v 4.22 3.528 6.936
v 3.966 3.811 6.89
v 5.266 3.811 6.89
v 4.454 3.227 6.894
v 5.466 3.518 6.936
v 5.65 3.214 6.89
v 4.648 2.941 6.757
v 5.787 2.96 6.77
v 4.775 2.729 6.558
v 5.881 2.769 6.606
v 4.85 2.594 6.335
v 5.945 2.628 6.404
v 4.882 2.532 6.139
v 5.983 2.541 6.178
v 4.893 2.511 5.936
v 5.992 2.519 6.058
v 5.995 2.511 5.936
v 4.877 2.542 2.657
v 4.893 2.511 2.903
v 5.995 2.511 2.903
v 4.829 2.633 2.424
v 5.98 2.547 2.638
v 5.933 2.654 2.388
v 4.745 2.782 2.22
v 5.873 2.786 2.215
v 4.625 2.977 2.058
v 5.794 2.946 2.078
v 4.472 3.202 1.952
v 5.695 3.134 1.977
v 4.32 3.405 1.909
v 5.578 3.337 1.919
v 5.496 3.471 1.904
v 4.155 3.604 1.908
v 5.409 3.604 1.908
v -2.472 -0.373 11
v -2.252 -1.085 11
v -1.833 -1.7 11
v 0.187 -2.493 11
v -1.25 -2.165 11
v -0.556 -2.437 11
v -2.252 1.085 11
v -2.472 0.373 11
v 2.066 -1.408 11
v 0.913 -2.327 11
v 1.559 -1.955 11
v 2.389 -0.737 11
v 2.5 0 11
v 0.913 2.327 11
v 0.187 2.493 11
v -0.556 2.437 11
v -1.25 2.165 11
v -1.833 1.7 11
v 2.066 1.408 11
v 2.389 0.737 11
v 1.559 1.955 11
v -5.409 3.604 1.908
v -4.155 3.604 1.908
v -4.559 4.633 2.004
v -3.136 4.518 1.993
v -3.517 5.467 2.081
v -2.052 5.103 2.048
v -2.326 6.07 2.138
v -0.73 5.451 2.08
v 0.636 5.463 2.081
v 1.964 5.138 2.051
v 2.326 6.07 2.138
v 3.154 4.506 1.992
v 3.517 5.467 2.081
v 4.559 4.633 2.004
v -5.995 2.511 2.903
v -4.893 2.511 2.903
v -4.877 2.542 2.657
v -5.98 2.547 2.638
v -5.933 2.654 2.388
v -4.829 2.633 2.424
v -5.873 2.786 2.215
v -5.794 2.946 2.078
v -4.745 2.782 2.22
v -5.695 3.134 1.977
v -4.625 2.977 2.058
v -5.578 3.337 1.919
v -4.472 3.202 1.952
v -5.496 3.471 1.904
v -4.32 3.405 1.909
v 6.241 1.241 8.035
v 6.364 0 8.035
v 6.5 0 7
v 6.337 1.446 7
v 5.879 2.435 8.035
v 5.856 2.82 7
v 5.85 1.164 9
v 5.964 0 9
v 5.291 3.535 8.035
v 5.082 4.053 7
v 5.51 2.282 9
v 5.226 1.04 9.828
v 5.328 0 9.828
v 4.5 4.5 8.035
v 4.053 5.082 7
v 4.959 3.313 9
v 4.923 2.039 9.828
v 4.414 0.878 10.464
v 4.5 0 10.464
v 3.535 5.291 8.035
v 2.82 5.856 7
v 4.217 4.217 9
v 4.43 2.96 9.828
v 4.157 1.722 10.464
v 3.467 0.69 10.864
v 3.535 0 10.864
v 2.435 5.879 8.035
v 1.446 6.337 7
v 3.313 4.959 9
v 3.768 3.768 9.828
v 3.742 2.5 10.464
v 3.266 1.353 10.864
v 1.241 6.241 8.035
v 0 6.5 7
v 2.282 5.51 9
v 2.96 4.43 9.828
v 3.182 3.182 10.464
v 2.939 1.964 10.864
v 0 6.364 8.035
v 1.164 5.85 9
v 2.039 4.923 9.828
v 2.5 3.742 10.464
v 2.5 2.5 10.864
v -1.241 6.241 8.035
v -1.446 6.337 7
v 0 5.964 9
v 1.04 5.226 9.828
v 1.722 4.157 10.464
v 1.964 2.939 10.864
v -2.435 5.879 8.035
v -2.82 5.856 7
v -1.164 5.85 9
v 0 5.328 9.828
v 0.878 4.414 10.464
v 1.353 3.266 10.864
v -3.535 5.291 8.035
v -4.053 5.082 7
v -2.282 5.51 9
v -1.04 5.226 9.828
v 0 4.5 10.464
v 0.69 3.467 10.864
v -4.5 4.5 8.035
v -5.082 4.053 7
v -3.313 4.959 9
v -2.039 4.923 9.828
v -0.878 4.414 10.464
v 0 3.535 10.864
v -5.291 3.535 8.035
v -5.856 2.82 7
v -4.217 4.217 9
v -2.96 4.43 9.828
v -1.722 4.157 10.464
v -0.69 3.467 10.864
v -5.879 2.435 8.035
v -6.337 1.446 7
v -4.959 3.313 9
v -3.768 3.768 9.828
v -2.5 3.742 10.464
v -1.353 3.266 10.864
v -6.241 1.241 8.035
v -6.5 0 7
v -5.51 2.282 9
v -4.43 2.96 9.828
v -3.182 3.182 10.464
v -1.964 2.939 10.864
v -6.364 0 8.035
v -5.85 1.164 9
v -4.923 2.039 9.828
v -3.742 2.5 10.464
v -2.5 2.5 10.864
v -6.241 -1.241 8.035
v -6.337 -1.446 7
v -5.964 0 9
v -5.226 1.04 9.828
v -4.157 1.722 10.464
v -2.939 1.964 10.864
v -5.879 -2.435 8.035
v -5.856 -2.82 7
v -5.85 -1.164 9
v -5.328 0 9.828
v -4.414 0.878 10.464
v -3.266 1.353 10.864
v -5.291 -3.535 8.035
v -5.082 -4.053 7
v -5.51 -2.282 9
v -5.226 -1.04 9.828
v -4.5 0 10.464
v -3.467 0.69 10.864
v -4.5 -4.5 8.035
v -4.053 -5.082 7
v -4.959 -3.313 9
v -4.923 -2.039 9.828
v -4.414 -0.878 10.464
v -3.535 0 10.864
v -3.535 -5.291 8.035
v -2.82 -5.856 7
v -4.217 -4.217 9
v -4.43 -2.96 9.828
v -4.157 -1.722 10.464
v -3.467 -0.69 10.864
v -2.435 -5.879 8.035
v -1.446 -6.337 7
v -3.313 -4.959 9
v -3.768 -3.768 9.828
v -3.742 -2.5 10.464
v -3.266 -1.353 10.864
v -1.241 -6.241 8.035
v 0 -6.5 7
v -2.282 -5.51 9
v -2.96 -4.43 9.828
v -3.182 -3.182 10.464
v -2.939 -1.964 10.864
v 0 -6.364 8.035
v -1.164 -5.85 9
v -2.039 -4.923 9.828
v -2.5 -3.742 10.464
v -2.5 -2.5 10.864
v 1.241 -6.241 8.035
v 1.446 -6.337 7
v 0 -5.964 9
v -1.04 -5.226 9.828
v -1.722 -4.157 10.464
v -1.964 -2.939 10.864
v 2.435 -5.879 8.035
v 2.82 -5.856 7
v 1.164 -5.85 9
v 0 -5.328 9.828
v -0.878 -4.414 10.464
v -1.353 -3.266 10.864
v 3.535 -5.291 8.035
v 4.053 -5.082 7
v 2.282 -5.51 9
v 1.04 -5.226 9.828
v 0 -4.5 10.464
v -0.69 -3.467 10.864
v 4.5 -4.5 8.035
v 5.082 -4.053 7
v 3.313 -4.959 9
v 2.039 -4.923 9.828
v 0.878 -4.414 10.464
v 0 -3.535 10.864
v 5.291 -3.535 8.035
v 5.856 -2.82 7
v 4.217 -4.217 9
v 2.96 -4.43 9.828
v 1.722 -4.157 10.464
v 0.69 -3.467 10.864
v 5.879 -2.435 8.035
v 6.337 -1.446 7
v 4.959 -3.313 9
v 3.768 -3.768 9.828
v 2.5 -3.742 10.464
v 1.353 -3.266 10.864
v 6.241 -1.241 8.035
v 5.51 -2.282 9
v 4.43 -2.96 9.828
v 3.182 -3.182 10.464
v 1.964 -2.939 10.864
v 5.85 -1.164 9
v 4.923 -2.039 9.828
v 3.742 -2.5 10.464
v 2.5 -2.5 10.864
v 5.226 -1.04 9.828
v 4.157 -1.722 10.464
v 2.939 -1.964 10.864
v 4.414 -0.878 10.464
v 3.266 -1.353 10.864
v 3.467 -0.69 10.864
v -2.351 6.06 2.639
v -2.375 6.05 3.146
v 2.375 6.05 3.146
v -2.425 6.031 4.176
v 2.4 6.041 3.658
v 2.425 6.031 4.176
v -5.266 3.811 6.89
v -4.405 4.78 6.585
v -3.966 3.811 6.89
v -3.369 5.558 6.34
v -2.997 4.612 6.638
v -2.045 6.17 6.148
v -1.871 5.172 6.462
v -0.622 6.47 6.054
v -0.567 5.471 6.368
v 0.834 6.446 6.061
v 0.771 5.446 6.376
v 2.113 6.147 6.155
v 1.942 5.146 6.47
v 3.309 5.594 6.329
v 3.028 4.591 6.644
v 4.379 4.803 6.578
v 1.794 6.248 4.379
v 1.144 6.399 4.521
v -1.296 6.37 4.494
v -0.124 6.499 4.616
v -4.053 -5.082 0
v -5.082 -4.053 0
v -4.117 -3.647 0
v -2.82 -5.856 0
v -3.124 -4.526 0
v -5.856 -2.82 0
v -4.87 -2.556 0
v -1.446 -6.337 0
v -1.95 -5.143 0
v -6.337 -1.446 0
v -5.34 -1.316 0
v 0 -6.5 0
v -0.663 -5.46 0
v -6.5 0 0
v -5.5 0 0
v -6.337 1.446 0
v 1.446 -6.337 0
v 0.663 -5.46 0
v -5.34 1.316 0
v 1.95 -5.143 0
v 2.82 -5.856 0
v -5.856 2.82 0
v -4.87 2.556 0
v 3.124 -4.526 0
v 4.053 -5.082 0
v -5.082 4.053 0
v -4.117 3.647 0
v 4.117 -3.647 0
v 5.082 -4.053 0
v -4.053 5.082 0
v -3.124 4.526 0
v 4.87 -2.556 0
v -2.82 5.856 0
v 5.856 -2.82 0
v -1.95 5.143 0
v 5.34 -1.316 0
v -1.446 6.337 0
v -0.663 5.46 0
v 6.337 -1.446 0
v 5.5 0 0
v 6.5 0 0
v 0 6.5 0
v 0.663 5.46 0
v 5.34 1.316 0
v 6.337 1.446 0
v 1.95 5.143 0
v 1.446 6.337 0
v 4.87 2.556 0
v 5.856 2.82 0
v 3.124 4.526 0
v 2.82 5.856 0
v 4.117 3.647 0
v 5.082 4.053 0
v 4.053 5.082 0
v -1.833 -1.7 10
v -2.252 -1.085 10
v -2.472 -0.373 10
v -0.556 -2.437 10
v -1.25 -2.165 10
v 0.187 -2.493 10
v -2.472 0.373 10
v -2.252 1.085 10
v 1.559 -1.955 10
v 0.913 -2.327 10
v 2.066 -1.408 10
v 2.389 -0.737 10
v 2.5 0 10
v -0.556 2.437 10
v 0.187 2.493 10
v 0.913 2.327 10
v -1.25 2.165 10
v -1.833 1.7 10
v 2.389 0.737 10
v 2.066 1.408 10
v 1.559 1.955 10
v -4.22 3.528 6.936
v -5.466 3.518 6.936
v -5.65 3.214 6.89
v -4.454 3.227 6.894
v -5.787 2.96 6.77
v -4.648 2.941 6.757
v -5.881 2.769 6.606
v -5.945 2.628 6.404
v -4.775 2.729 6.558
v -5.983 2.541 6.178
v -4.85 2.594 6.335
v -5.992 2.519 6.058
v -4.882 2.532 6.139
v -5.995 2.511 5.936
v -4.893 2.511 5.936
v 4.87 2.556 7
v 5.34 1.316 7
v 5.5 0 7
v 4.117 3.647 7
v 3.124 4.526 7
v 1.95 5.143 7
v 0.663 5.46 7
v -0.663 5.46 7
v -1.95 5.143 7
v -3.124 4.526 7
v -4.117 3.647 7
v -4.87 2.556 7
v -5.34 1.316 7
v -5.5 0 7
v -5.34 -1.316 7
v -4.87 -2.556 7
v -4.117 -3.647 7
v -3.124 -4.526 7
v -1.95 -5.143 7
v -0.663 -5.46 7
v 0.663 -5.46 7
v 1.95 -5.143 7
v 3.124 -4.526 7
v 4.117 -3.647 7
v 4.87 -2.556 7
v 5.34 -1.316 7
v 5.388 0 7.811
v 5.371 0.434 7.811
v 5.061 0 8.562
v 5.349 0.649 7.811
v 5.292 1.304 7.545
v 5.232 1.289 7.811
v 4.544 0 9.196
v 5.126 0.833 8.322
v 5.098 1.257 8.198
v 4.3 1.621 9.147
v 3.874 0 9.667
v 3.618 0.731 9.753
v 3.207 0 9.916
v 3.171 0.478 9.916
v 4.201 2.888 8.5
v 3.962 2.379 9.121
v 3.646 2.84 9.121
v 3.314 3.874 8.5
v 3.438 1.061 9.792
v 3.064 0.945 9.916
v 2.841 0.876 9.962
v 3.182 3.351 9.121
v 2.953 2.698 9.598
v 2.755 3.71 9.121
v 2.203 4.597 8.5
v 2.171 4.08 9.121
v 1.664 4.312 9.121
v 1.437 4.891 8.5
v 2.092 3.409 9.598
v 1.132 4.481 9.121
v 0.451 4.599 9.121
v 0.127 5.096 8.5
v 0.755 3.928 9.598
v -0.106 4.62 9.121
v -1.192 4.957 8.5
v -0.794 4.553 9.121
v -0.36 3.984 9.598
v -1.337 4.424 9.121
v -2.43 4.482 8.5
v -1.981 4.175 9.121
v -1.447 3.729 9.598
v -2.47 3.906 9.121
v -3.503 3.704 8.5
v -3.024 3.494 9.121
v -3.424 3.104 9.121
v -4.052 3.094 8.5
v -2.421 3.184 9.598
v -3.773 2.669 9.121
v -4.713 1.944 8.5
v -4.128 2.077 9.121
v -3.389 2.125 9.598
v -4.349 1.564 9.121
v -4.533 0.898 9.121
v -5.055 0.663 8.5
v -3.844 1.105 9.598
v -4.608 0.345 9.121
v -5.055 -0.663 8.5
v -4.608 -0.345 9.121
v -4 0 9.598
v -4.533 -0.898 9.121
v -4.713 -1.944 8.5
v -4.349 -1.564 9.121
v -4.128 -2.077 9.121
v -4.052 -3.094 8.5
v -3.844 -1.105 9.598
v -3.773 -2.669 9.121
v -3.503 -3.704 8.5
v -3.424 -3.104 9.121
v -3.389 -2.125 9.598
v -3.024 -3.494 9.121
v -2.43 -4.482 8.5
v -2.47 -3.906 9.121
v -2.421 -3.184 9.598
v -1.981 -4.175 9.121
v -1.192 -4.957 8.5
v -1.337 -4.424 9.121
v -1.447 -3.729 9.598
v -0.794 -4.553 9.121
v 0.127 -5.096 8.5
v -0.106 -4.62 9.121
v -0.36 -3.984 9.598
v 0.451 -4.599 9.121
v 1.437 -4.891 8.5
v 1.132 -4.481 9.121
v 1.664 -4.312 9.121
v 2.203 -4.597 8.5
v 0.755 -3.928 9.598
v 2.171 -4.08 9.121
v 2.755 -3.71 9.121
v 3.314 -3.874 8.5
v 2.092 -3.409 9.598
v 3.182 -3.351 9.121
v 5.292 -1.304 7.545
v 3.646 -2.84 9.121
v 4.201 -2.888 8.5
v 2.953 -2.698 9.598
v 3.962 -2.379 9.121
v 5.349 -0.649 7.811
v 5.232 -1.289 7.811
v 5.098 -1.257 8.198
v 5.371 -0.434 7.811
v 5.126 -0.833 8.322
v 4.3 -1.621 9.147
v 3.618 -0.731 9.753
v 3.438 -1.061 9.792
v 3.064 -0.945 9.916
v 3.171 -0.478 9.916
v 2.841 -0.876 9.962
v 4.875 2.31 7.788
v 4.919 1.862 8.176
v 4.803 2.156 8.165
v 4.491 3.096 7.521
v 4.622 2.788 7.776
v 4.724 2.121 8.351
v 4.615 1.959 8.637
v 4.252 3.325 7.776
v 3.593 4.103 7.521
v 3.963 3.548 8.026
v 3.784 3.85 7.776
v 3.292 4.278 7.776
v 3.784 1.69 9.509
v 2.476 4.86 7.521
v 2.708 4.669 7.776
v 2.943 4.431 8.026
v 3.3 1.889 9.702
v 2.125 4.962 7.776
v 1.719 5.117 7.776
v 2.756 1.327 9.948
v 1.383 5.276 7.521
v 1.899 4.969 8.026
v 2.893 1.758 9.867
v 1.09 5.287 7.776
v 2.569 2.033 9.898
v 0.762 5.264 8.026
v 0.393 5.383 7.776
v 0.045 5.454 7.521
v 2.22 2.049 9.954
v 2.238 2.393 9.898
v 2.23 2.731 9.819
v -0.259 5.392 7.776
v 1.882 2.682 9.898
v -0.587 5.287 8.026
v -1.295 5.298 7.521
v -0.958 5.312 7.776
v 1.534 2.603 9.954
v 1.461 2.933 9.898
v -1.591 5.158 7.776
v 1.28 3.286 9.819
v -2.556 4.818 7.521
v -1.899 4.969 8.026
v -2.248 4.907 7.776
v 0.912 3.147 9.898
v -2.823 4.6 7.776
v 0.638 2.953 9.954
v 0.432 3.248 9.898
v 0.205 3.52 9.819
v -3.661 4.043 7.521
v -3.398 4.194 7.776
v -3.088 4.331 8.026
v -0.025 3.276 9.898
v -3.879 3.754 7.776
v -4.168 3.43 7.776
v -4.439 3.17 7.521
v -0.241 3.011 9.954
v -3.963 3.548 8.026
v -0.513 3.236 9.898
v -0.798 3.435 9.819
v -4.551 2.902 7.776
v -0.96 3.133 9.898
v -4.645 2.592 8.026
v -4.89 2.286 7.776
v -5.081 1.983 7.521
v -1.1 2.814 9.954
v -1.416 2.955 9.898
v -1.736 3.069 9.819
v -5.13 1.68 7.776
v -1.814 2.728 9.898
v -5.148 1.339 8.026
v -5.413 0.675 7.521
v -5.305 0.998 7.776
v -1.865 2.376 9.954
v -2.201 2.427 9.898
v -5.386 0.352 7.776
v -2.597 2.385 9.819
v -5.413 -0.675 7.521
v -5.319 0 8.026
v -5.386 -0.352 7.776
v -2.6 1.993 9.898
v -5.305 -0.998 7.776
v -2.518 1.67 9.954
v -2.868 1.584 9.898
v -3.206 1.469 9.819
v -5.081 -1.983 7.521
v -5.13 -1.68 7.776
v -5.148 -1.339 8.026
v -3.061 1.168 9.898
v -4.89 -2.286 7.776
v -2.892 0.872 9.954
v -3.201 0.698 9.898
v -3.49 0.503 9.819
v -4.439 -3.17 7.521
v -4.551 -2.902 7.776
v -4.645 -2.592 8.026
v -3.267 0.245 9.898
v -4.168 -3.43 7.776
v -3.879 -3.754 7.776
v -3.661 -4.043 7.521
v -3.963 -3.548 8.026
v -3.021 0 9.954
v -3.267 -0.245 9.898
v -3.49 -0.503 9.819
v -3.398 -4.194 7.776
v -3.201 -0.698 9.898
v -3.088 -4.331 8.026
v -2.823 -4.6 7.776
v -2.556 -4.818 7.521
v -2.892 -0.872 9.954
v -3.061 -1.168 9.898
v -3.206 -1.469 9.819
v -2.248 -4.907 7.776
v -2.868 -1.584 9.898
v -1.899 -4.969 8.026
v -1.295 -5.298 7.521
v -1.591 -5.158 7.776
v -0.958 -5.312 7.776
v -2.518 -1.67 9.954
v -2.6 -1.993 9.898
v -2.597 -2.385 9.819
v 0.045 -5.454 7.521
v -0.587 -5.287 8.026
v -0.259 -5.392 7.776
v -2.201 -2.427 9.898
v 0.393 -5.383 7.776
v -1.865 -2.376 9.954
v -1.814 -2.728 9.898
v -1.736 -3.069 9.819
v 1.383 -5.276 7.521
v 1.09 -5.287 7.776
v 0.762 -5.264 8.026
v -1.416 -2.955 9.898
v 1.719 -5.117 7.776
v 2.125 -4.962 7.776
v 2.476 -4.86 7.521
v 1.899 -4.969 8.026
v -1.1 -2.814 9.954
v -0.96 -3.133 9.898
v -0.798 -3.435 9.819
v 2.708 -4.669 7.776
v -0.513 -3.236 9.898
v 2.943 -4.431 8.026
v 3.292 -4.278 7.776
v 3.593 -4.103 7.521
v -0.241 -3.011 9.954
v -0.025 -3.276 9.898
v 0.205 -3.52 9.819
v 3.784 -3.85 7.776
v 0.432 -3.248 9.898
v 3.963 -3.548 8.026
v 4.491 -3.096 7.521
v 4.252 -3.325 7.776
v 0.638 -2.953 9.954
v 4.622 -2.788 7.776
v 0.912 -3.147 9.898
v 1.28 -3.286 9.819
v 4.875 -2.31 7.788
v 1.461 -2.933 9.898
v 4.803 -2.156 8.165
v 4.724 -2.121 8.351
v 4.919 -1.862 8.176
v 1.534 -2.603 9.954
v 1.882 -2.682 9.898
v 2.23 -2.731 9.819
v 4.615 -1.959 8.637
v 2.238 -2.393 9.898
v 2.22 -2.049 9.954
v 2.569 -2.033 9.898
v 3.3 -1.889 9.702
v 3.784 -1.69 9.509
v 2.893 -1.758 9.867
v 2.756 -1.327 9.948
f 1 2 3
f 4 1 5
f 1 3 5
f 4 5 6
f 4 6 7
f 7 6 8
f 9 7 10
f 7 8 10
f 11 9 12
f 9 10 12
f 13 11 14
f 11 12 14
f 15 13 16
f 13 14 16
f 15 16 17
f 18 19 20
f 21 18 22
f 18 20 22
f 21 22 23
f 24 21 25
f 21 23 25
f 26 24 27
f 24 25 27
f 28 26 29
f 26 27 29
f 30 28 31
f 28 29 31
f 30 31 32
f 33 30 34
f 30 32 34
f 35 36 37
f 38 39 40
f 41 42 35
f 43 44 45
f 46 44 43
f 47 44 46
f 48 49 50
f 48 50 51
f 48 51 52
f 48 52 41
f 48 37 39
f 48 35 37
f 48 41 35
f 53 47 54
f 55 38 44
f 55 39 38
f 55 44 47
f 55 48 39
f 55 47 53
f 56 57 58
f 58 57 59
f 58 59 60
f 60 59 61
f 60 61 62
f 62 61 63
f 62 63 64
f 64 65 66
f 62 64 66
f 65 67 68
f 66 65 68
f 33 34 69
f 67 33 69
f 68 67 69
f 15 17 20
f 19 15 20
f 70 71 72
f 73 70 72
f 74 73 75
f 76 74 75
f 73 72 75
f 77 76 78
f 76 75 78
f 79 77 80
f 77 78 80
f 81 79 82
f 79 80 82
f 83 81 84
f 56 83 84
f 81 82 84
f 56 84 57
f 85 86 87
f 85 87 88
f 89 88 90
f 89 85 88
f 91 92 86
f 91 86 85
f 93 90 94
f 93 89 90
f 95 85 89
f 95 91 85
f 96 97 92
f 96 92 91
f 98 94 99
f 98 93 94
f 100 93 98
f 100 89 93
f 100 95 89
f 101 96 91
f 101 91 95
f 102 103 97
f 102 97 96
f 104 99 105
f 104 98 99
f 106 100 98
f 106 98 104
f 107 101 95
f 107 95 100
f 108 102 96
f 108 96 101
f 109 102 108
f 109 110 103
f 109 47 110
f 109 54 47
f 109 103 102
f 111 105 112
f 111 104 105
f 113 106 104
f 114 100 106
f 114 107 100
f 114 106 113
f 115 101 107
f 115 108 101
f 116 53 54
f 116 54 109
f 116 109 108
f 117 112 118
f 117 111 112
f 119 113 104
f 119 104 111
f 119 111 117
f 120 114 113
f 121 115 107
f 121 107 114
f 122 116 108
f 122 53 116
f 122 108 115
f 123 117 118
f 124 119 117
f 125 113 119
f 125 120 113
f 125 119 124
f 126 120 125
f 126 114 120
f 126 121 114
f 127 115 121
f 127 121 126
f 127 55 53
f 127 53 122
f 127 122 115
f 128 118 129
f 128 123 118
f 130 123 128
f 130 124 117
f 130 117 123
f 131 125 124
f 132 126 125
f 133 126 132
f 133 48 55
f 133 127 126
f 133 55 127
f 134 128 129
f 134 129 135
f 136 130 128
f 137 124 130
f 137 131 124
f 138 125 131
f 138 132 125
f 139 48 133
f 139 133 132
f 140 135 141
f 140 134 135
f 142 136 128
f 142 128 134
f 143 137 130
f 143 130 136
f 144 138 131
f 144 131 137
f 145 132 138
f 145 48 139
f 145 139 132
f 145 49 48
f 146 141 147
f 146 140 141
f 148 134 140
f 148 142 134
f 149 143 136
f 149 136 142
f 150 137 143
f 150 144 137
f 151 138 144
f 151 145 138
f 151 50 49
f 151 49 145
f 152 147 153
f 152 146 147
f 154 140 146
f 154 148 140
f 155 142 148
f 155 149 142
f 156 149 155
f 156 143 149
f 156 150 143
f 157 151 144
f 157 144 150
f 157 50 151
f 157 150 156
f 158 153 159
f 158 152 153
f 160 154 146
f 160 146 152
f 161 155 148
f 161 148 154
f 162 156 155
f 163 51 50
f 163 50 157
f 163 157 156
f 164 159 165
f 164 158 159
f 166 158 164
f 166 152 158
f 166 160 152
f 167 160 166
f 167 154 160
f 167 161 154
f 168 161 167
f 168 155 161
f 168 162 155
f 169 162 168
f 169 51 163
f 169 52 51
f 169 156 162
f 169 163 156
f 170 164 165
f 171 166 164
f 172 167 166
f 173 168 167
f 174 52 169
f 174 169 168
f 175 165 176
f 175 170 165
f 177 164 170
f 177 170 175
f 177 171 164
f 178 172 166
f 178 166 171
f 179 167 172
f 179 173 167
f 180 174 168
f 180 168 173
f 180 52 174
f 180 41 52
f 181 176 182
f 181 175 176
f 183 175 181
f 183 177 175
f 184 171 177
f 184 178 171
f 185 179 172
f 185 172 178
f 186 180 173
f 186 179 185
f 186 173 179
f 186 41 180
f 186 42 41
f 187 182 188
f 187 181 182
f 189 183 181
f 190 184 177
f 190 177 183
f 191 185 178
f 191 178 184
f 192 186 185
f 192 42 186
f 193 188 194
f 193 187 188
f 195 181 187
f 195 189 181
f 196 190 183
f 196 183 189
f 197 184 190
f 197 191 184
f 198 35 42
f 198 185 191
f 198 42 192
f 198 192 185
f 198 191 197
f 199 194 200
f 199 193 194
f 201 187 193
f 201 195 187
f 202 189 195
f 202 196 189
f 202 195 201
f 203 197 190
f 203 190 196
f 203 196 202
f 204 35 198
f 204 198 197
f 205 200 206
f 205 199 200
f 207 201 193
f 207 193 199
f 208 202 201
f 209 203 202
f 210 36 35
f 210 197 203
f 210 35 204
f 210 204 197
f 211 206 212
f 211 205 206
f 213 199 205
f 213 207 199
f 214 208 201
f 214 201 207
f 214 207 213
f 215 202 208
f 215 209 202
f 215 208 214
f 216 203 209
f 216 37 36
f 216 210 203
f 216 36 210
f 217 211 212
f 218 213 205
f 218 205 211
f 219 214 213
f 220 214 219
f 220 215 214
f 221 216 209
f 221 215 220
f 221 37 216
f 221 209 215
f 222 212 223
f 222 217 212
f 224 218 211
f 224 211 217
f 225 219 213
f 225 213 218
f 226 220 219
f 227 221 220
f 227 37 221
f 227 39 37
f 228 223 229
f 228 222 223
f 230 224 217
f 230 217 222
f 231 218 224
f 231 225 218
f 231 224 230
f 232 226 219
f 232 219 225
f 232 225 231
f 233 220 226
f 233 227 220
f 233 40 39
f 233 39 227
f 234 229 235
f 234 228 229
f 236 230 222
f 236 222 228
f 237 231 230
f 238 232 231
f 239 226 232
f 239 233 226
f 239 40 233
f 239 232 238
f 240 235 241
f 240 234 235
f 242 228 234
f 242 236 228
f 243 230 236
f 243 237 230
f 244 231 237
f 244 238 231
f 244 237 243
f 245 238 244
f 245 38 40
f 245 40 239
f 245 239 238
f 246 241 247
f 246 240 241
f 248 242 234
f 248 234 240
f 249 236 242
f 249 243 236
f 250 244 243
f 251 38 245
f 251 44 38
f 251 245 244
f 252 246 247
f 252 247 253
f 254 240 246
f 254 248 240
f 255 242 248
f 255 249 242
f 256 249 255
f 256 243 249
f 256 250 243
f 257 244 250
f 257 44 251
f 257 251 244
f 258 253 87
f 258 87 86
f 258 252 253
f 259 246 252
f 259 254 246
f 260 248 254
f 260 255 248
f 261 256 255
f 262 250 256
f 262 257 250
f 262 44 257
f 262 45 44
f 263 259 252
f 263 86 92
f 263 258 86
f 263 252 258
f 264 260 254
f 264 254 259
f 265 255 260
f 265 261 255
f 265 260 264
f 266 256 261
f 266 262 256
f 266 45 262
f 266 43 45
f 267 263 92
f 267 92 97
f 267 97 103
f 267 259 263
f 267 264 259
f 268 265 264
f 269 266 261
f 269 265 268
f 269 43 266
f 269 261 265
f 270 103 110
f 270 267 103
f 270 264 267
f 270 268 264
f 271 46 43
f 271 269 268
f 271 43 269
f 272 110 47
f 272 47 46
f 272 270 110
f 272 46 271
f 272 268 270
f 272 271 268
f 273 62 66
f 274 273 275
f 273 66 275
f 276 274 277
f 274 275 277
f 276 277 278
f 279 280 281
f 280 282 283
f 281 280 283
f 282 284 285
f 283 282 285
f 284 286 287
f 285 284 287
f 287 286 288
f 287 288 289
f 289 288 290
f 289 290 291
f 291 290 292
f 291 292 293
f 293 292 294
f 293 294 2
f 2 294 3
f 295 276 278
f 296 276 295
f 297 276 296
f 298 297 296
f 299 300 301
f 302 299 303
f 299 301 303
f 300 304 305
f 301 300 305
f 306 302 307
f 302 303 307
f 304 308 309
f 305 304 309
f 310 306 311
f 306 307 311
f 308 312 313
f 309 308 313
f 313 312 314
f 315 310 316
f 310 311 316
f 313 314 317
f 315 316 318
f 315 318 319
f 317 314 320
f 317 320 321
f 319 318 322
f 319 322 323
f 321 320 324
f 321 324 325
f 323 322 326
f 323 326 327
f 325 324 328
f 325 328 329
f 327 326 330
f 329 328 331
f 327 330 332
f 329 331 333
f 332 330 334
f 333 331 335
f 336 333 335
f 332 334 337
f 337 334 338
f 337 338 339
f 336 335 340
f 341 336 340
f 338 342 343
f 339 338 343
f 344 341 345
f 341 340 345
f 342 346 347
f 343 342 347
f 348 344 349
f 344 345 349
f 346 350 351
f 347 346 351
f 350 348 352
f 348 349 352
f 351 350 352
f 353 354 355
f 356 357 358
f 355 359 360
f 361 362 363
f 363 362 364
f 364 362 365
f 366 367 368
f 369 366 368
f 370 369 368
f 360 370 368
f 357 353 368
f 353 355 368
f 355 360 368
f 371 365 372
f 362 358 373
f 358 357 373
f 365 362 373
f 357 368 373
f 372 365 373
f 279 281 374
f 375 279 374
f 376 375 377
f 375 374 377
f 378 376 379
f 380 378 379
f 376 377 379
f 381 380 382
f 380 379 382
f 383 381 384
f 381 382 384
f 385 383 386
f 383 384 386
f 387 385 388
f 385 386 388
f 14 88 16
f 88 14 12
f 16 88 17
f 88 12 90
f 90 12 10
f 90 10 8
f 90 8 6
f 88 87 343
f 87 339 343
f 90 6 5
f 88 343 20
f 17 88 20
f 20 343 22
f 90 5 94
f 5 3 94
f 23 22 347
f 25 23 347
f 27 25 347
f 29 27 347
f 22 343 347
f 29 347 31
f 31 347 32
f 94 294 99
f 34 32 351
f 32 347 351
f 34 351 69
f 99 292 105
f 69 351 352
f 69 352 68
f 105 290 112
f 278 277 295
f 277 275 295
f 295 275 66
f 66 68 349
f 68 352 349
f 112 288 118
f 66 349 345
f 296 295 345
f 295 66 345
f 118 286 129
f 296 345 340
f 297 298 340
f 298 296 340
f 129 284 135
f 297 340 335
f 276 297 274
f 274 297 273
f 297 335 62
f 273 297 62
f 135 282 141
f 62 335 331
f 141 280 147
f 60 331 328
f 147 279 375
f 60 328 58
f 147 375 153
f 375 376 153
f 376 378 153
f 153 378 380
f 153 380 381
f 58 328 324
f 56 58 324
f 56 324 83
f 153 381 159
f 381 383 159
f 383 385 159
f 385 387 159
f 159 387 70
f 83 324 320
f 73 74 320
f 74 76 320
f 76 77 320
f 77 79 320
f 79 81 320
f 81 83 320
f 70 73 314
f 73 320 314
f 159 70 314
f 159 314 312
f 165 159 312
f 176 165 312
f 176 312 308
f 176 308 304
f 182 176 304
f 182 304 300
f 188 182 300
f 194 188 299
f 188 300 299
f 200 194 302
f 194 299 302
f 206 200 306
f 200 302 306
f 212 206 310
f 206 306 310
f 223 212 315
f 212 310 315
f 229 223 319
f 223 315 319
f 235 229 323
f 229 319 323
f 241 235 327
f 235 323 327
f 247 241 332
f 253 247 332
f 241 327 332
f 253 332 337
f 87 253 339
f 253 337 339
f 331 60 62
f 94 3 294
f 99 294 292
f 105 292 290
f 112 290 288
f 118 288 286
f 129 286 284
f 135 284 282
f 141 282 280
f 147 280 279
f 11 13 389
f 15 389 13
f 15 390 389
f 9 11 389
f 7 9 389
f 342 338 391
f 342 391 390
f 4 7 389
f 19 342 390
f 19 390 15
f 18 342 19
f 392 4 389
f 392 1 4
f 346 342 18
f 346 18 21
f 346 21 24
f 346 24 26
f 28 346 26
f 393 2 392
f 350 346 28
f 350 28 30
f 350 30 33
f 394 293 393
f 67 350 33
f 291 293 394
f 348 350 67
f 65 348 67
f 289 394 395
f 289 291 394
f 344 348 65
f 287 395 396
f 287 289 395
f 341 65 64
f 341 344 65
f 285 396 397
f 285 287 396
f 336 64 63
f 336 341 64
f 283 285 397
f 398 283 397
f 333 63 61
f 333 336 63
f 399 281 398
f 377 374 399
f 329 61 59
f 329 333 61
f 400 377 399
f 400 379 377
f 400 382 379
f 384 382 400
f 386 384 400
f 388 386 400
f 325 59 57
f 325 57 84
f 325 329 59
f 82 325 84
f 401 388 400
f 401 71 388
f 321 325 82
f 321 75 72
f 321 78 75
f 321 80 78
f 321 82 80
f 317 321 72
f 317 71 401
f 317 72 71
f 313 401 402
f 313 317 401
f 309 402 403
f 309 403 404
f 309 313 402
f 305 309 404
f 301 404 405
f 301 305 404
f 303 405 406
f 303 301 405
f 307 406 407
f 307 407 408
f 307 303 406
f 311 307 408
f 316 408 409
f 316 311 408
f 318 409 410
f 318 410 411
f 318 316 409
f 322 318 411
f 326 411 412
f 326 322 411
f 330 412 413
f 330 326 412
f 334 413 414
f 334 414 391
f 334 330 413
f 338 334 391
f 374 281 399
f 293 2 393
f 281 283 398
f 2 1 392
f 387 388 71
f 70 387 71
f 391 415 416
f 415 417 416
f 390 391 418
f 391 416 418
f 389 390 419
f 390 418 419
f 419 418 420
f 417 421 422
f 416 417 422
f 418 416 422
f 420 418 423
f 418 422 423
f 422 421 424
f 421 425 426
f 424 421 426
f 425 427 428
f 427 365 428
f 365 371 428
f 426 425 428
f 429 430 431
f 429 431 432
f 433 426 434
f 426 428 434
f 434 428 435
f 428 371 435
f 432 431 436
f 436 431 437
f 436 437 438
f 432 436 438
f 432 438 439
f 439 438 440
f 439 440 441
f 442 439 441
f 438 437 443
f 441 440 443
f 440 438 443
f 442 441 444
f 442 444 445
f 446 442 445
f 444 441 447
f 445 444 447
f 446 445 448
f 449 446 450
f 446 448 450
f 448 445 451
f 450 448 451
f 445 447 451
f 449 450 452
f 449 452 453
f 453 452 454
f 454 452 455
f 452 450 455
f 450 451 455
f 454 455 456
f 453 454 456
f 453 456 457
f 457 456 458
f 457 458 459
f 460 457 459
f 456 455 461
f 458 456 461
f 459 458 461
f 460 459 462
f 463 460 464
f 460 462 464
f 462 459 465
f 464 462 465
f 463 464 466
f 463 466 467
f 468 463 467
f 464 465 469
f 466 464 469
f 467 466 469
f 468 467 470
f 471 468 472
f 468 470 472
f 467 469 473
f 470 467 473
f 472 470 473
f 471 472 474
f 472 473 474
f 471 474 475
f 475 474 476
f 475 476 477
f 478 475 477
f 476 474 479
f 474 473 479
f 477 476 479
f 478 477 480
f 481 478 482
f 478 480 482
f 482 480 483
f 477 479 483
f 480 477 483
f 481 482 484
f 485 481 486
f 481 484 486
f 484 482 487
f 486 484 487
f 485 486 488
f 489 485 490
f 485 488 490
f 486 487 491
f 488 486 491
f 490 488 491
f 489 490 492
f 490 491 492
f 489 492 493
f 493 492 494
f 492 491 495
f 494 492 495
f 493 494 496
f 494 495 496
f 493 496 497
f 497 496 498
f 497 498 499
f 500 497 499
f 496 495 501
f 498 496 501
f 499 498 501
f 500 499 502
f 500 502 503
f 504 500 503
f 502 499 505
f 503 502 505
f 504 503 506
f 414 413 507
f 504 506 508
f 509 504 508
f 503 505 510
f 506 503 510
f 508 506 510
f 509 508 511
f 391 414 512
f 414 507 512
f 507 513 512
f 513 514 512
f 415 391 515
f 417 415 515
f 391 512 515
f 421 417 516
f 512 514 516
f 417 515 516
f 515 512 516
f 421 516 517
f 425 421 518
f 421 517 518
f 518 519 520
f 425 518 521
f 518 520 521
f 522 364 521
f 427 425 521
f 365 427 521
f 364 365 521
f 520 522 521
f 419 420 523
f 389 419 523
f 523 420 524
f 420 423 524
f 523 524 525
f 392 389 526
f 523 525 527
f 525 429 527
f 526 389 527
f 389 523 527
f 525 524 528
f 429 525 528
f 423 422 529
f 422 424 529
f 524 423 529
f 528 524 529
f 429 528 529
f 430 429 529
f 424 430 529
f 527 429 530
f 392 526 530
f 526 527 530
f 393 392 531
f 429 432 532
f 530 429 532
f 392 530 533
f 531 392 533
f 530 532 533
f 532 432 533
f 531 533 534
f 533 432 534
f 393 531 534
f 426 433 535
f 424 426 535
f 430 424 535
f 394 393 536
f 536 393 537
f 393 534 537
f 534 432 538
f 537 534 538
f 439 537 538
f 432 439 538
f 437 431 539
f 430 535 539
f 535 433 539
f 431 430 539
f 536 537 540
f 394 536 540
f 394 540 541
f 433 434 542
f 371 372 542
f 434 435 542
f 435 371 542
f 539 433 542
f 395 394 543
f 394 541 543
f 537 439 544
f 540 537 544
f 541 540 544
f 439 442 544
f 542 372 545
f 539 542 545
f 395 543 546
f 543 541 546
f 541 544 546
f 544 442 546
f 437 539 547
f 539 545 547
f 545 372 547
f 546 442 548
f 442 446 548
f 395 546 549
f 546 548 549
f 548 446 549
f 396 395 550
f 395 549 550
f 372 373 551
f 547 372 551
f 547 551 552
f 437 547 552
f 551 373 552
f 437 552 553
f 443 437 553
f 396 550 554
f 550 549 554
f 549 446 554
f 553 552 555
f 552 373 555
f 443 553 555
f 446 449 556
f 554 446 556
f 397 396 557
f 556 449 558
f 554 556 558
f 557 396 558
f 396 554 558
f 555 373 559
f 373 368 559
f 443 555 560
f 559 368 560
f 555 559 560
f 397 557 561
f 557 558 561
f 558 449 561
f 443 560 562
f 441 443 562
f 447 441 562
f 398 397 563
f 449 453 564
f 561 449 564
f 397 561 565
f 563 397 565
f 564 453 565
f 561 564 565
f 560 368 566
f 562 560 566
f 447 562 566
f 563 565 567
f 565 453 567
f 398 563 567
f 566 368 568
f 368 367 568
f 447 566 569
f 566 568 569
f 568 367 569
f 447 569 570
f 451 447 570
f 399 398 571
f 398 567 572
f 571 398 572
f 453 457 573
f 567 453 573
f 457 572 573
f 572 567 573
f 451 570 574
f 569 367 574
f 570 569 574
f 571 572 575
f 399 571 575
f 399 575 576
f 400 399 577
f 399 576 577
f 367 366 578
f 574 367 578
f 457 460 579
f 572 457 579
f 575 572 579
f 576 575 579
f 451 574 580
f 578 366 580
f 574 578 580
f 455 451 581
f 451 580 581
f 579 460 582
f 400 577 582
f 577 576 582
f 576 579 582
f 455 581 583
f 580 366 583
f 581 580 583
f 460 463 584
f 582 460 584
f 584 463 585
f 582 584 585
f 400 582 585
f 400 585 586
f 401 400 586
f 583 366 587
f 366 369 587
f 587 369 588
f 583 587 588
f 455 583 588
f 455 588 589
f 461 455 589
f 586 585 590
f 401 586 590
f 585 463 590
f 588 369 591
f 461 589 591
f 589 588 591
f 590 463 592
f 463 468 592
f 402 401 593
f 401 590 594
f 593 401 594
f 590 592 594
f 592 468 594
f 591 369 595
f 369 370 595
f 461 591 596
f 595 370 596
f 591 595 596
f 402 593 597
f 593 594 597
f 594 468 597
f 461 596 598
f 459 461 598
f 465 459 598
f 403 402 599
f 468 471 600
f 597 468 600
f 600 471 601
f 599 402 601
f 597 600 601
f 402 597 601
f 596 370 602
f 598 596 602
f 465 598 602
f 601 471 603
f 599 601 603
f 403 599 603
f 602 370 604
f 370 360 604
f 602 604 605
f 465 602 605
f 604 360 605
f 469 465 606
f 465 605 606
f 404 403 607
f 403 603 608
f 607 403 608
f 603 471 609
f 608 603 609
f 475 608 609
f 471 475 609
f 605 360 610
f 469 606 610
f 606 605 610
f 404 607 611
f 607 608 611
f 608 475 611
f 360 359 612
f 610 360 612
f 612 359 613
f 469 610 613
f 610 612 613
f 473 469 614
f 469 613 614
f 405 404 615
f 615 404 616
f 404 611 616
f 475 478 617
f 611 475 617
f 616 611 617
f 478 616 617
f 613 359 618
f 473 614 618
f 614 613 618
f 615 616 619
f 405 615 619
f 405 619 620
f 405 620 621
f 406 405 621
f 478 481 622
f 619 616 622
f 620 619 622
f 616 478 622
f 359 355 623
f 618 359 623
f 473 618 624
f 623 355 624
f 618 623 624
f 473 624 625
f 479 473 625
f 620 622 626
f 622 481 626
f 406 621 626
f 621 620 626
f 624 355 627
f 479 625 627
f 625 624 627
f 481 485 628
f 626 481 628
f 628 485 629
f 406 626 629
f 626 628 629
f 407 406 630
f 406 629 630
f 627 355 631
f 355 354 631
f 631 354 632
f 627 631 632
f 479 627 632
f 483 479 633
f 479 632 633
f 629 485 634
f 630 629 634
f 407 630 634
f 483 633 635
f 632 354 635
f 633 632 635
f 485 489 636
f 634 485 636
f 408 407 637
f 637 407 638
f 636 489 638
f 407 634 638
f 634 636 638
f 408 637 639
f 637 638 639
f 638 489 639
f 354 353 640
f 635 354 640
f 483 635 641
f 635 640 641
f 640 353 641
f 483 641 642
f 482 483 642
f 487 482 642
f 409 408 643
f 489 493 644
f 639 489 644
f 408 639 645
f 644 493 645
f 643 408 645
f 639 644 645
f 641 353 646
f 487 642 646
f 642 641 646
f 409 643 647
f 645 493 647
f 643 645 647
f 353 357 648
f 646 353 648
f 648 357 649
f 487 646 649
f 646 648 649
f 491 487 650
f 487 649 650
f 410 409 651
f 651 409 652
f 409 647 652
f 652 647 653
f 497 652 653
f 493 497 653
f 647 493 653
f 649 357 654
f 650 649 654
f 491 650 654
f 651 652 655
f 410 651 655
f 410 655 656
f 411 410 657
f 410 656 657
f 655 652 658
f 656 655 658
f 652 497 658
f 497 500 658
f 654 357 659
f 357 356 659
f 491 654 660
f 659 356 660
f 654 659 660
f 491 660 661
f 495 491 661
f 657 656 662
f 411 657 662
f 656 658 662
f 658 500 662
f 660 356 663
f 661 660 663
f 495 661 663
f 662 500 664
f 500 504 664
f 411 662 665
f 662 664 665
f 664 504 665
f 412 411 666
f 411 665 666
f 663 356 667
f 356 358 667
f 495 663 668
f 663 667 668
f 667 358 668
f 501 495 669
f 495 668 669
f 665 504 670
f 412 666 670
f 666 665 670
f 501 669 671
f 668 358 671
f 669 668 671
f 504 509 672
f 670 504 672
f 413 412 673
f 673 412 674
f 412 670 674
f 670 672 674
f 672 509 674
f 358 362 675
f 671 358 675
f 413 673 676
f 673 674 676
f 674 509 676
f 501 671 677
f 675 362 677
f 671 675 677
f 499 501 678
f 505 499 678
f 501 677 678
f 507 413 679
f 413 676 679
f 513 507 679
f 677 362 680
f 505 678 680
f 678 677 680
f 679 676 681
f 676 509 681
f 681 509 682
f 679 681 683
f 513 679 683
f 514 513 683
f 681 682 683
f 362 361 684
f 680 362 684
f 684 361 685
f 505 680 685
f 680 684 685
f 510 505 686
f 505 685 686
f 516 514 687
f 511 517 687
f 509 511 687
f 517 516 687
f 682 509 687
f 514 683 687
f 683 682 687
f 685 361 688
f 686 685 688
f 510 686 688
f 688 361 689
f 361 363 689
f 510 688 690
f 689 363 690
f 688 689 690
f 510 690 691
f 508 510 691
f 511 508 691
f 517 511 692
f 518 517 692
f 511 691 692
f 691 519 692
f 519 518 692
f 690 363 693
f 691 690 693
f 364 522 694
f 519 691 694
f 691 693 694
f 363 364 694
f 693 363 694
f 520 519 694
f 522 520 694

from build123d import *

# Parameters (mm, degrees)
F0_R     = 6.5
F1_DEPTH = 11
F2_R     = 4
F3_T     = -1
F5_DEPTH = 12.5


with BuildPart() as f1:
    # F0 (on Top) → F1 (new body)
    with BuildSketch(Plane.XY):
        Circle(F0_R)
    extrude(amount=F1_DEPTH)

    # F2
    f2_edges = [f1.edges().sort_by_distance(p)[0] for p in [
        (-6.5, 0, 11),
    ]]
    fillet(f2_edges, radius=F2_R)

    # F3
    f3_openings = [f1.faces().sort_by_distance(p)[0] for p in [
        (0, 0, 0),
    ]]
    offset(amount=F3_T, openings=f3_openings)

    # F4 (on Right) → F5 (cut, symmetric)
    with BuildSketch(Plane.YZ):
        with BuildLine():
            Line((6.030791, 4.17559), (7.637922, 5.686835))
            Line((7.637922, 5.686835), (3.811015, 6.88965))
            ThreePointArc((3.811015, 6.88965), (2.919498, 6.741838), (2.511172, 5.935661))
            Line((2.511172, 5.935661), (2.511172, 2.903478))
            ThreePointArc((2.511172, 2.903478), (2.837681, 2.164282), (3.603992, 1.907795))
            Line((3.603992, 1.907795), (6.069606, 2.137645))
            Line((6.069606, 2.137645), (6.030791, 4.17559))
        make_face()
    extrude(amount=F5_DEPTH, both=True, mode=Mode.SUBTRACT)


solid = f1.part
